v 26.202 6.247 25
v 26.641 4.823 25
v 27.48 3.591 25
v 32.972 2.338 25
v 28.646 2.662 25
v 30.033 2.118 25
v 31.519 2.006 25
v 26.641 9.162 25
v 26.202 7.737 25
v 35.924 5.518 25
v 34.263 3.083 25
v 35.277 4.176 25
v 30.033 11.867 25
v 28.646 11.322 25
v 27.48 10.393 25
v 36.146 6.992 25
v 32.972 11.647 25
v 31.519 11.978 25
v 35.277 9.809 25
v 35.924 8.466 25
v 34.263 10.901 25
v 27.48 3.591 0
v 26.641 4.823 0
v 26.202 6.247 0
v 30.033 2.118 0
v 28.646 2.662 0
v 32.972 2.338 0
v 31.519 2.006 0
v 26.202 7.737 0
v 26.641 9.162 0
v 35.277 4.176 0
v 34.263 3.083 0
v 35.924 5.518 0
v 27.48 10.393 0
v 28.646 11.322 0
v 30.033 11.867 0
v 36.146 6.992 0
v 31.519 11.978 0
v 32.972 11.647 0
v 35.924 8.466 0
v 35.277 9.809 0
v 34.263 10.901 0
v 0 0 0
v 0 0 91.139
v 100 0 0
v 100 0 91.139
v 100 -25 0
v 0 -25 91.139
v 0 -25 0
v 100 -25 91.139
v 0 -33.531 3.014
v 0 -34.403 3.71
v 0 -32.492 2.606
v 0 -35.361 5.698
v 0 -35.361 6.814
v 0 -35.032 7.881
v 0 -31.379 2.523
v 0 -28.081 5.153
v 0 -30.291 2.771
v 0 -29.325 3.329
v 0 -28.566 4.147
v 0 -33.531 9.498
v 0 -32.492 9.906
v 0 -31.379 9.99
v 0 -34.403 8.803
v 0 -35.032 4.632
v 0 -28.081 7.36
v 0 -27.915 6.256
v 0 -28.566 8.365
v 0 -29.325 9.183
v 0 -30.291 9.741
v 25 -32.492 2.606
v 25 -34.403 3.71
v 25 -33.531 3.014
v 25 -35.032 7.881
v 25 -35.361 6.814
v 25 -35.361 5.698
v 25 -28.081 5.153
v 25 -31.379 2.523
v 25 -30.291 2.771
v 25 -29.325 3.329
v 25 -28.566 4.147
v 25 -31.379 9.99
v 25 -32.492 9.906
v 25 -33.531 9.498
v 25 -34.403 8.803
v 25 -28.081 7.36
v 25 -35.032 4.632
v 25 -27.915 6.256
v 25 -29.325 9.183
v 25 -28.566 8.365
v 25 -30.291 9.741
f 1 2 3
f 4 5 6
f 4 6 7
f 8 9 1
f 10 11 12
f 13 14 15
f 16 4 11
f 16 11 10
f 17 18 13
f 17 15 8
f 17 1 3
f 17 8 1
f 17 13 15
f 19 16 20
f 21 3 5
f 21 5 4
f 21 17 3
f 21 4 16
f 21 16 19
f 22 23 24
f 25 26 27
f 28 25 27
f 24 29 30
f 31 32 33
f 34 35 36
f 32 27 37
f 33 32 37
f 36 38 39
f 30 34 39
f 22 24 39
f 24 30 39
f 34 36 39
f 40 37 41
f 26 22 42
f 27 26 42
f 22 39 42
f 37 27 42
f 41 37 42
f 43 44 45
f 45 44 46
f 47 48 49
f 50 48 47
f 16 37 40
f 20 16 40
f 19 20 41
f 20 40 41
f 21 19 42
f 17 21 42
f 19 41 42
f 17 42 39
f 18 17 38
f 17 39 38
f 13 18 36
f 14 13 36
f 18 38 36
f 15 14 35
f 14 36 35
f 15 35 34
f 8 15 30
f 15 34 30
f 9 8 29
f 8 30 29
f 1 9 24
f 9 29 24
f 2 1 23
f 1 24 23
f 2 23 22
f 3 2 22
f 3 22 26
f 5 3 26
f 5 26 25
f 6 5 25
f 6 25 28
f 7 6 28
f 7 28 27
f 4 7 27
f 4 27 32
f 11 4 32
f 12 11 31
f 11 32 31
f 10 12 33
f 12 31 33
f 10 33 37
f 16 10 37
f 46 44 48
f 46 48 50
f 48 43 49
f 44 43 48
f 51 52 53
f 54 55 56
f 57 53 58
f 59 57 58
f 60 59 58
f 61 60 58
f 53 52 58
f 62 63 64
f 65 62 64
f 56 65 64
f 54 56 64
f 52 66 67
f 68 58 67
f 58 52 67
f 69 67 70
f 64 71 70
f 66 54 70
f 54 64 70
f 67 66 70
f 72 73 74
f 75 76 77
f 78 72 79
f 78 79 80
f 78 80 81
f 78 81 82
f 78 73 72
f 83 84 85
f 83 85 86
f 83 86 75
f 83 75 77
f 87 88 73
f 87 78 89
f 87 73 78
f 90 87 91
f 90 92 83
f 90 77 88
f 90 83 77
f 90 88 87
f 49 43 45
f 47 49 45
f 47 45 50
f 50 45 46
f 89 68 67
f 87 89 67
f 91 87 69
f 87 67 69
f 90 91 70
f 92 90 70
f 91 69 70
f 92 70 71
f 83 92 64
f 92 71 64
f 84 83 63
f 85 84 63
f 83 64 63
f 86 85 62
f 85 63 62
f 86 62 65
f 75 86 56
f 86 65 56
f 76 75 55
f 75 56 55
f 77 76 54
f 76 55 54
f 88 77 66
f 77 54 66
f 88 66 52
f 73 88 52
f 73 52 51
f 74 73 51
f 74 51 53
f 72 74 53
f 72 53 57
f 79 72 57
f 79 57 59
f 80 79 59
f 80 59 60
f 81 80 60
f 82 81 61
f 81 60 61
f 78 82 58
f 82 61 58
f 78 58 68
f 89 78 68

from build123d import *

# Parameters (mm, degrees)
F0_W     = 100
F0_H     = 91.139289
F1_DEPTH = 25
F2_R     = 5
F3_DEPTH = 25
F4_R     = 3.743875
F5_DEPTH = 25


with BuildPart() as f1:
    # F0 (on Front) → F1 (new body)
    with BuildSketch(Plane.XZ):
        with Locations((50, 45.569644)):
            Rectangle(F0_W, F0_H)
    extrude(amount=F1_DEPTH)


with BuildPart() as f3:
    # F2 (on Top) → F3 (new body)
    with BuildSketch(Plane.XY):
        with Locations((31.145737, 6.992146)):
            Circle(F2_R)
    extrude(amount=F3_DEPTH)


with BuildPart() as f5:
    # F4 (on Right) → F5 (new body)
    with BuildSketch(Plane.YZ):
        with Locations((-31.658903, 6.256125)):
            Circle(F4_R)
    extrude(amount=F5_DEPTH)


solid = Compound([f1.part, f3.part, f5.part])
